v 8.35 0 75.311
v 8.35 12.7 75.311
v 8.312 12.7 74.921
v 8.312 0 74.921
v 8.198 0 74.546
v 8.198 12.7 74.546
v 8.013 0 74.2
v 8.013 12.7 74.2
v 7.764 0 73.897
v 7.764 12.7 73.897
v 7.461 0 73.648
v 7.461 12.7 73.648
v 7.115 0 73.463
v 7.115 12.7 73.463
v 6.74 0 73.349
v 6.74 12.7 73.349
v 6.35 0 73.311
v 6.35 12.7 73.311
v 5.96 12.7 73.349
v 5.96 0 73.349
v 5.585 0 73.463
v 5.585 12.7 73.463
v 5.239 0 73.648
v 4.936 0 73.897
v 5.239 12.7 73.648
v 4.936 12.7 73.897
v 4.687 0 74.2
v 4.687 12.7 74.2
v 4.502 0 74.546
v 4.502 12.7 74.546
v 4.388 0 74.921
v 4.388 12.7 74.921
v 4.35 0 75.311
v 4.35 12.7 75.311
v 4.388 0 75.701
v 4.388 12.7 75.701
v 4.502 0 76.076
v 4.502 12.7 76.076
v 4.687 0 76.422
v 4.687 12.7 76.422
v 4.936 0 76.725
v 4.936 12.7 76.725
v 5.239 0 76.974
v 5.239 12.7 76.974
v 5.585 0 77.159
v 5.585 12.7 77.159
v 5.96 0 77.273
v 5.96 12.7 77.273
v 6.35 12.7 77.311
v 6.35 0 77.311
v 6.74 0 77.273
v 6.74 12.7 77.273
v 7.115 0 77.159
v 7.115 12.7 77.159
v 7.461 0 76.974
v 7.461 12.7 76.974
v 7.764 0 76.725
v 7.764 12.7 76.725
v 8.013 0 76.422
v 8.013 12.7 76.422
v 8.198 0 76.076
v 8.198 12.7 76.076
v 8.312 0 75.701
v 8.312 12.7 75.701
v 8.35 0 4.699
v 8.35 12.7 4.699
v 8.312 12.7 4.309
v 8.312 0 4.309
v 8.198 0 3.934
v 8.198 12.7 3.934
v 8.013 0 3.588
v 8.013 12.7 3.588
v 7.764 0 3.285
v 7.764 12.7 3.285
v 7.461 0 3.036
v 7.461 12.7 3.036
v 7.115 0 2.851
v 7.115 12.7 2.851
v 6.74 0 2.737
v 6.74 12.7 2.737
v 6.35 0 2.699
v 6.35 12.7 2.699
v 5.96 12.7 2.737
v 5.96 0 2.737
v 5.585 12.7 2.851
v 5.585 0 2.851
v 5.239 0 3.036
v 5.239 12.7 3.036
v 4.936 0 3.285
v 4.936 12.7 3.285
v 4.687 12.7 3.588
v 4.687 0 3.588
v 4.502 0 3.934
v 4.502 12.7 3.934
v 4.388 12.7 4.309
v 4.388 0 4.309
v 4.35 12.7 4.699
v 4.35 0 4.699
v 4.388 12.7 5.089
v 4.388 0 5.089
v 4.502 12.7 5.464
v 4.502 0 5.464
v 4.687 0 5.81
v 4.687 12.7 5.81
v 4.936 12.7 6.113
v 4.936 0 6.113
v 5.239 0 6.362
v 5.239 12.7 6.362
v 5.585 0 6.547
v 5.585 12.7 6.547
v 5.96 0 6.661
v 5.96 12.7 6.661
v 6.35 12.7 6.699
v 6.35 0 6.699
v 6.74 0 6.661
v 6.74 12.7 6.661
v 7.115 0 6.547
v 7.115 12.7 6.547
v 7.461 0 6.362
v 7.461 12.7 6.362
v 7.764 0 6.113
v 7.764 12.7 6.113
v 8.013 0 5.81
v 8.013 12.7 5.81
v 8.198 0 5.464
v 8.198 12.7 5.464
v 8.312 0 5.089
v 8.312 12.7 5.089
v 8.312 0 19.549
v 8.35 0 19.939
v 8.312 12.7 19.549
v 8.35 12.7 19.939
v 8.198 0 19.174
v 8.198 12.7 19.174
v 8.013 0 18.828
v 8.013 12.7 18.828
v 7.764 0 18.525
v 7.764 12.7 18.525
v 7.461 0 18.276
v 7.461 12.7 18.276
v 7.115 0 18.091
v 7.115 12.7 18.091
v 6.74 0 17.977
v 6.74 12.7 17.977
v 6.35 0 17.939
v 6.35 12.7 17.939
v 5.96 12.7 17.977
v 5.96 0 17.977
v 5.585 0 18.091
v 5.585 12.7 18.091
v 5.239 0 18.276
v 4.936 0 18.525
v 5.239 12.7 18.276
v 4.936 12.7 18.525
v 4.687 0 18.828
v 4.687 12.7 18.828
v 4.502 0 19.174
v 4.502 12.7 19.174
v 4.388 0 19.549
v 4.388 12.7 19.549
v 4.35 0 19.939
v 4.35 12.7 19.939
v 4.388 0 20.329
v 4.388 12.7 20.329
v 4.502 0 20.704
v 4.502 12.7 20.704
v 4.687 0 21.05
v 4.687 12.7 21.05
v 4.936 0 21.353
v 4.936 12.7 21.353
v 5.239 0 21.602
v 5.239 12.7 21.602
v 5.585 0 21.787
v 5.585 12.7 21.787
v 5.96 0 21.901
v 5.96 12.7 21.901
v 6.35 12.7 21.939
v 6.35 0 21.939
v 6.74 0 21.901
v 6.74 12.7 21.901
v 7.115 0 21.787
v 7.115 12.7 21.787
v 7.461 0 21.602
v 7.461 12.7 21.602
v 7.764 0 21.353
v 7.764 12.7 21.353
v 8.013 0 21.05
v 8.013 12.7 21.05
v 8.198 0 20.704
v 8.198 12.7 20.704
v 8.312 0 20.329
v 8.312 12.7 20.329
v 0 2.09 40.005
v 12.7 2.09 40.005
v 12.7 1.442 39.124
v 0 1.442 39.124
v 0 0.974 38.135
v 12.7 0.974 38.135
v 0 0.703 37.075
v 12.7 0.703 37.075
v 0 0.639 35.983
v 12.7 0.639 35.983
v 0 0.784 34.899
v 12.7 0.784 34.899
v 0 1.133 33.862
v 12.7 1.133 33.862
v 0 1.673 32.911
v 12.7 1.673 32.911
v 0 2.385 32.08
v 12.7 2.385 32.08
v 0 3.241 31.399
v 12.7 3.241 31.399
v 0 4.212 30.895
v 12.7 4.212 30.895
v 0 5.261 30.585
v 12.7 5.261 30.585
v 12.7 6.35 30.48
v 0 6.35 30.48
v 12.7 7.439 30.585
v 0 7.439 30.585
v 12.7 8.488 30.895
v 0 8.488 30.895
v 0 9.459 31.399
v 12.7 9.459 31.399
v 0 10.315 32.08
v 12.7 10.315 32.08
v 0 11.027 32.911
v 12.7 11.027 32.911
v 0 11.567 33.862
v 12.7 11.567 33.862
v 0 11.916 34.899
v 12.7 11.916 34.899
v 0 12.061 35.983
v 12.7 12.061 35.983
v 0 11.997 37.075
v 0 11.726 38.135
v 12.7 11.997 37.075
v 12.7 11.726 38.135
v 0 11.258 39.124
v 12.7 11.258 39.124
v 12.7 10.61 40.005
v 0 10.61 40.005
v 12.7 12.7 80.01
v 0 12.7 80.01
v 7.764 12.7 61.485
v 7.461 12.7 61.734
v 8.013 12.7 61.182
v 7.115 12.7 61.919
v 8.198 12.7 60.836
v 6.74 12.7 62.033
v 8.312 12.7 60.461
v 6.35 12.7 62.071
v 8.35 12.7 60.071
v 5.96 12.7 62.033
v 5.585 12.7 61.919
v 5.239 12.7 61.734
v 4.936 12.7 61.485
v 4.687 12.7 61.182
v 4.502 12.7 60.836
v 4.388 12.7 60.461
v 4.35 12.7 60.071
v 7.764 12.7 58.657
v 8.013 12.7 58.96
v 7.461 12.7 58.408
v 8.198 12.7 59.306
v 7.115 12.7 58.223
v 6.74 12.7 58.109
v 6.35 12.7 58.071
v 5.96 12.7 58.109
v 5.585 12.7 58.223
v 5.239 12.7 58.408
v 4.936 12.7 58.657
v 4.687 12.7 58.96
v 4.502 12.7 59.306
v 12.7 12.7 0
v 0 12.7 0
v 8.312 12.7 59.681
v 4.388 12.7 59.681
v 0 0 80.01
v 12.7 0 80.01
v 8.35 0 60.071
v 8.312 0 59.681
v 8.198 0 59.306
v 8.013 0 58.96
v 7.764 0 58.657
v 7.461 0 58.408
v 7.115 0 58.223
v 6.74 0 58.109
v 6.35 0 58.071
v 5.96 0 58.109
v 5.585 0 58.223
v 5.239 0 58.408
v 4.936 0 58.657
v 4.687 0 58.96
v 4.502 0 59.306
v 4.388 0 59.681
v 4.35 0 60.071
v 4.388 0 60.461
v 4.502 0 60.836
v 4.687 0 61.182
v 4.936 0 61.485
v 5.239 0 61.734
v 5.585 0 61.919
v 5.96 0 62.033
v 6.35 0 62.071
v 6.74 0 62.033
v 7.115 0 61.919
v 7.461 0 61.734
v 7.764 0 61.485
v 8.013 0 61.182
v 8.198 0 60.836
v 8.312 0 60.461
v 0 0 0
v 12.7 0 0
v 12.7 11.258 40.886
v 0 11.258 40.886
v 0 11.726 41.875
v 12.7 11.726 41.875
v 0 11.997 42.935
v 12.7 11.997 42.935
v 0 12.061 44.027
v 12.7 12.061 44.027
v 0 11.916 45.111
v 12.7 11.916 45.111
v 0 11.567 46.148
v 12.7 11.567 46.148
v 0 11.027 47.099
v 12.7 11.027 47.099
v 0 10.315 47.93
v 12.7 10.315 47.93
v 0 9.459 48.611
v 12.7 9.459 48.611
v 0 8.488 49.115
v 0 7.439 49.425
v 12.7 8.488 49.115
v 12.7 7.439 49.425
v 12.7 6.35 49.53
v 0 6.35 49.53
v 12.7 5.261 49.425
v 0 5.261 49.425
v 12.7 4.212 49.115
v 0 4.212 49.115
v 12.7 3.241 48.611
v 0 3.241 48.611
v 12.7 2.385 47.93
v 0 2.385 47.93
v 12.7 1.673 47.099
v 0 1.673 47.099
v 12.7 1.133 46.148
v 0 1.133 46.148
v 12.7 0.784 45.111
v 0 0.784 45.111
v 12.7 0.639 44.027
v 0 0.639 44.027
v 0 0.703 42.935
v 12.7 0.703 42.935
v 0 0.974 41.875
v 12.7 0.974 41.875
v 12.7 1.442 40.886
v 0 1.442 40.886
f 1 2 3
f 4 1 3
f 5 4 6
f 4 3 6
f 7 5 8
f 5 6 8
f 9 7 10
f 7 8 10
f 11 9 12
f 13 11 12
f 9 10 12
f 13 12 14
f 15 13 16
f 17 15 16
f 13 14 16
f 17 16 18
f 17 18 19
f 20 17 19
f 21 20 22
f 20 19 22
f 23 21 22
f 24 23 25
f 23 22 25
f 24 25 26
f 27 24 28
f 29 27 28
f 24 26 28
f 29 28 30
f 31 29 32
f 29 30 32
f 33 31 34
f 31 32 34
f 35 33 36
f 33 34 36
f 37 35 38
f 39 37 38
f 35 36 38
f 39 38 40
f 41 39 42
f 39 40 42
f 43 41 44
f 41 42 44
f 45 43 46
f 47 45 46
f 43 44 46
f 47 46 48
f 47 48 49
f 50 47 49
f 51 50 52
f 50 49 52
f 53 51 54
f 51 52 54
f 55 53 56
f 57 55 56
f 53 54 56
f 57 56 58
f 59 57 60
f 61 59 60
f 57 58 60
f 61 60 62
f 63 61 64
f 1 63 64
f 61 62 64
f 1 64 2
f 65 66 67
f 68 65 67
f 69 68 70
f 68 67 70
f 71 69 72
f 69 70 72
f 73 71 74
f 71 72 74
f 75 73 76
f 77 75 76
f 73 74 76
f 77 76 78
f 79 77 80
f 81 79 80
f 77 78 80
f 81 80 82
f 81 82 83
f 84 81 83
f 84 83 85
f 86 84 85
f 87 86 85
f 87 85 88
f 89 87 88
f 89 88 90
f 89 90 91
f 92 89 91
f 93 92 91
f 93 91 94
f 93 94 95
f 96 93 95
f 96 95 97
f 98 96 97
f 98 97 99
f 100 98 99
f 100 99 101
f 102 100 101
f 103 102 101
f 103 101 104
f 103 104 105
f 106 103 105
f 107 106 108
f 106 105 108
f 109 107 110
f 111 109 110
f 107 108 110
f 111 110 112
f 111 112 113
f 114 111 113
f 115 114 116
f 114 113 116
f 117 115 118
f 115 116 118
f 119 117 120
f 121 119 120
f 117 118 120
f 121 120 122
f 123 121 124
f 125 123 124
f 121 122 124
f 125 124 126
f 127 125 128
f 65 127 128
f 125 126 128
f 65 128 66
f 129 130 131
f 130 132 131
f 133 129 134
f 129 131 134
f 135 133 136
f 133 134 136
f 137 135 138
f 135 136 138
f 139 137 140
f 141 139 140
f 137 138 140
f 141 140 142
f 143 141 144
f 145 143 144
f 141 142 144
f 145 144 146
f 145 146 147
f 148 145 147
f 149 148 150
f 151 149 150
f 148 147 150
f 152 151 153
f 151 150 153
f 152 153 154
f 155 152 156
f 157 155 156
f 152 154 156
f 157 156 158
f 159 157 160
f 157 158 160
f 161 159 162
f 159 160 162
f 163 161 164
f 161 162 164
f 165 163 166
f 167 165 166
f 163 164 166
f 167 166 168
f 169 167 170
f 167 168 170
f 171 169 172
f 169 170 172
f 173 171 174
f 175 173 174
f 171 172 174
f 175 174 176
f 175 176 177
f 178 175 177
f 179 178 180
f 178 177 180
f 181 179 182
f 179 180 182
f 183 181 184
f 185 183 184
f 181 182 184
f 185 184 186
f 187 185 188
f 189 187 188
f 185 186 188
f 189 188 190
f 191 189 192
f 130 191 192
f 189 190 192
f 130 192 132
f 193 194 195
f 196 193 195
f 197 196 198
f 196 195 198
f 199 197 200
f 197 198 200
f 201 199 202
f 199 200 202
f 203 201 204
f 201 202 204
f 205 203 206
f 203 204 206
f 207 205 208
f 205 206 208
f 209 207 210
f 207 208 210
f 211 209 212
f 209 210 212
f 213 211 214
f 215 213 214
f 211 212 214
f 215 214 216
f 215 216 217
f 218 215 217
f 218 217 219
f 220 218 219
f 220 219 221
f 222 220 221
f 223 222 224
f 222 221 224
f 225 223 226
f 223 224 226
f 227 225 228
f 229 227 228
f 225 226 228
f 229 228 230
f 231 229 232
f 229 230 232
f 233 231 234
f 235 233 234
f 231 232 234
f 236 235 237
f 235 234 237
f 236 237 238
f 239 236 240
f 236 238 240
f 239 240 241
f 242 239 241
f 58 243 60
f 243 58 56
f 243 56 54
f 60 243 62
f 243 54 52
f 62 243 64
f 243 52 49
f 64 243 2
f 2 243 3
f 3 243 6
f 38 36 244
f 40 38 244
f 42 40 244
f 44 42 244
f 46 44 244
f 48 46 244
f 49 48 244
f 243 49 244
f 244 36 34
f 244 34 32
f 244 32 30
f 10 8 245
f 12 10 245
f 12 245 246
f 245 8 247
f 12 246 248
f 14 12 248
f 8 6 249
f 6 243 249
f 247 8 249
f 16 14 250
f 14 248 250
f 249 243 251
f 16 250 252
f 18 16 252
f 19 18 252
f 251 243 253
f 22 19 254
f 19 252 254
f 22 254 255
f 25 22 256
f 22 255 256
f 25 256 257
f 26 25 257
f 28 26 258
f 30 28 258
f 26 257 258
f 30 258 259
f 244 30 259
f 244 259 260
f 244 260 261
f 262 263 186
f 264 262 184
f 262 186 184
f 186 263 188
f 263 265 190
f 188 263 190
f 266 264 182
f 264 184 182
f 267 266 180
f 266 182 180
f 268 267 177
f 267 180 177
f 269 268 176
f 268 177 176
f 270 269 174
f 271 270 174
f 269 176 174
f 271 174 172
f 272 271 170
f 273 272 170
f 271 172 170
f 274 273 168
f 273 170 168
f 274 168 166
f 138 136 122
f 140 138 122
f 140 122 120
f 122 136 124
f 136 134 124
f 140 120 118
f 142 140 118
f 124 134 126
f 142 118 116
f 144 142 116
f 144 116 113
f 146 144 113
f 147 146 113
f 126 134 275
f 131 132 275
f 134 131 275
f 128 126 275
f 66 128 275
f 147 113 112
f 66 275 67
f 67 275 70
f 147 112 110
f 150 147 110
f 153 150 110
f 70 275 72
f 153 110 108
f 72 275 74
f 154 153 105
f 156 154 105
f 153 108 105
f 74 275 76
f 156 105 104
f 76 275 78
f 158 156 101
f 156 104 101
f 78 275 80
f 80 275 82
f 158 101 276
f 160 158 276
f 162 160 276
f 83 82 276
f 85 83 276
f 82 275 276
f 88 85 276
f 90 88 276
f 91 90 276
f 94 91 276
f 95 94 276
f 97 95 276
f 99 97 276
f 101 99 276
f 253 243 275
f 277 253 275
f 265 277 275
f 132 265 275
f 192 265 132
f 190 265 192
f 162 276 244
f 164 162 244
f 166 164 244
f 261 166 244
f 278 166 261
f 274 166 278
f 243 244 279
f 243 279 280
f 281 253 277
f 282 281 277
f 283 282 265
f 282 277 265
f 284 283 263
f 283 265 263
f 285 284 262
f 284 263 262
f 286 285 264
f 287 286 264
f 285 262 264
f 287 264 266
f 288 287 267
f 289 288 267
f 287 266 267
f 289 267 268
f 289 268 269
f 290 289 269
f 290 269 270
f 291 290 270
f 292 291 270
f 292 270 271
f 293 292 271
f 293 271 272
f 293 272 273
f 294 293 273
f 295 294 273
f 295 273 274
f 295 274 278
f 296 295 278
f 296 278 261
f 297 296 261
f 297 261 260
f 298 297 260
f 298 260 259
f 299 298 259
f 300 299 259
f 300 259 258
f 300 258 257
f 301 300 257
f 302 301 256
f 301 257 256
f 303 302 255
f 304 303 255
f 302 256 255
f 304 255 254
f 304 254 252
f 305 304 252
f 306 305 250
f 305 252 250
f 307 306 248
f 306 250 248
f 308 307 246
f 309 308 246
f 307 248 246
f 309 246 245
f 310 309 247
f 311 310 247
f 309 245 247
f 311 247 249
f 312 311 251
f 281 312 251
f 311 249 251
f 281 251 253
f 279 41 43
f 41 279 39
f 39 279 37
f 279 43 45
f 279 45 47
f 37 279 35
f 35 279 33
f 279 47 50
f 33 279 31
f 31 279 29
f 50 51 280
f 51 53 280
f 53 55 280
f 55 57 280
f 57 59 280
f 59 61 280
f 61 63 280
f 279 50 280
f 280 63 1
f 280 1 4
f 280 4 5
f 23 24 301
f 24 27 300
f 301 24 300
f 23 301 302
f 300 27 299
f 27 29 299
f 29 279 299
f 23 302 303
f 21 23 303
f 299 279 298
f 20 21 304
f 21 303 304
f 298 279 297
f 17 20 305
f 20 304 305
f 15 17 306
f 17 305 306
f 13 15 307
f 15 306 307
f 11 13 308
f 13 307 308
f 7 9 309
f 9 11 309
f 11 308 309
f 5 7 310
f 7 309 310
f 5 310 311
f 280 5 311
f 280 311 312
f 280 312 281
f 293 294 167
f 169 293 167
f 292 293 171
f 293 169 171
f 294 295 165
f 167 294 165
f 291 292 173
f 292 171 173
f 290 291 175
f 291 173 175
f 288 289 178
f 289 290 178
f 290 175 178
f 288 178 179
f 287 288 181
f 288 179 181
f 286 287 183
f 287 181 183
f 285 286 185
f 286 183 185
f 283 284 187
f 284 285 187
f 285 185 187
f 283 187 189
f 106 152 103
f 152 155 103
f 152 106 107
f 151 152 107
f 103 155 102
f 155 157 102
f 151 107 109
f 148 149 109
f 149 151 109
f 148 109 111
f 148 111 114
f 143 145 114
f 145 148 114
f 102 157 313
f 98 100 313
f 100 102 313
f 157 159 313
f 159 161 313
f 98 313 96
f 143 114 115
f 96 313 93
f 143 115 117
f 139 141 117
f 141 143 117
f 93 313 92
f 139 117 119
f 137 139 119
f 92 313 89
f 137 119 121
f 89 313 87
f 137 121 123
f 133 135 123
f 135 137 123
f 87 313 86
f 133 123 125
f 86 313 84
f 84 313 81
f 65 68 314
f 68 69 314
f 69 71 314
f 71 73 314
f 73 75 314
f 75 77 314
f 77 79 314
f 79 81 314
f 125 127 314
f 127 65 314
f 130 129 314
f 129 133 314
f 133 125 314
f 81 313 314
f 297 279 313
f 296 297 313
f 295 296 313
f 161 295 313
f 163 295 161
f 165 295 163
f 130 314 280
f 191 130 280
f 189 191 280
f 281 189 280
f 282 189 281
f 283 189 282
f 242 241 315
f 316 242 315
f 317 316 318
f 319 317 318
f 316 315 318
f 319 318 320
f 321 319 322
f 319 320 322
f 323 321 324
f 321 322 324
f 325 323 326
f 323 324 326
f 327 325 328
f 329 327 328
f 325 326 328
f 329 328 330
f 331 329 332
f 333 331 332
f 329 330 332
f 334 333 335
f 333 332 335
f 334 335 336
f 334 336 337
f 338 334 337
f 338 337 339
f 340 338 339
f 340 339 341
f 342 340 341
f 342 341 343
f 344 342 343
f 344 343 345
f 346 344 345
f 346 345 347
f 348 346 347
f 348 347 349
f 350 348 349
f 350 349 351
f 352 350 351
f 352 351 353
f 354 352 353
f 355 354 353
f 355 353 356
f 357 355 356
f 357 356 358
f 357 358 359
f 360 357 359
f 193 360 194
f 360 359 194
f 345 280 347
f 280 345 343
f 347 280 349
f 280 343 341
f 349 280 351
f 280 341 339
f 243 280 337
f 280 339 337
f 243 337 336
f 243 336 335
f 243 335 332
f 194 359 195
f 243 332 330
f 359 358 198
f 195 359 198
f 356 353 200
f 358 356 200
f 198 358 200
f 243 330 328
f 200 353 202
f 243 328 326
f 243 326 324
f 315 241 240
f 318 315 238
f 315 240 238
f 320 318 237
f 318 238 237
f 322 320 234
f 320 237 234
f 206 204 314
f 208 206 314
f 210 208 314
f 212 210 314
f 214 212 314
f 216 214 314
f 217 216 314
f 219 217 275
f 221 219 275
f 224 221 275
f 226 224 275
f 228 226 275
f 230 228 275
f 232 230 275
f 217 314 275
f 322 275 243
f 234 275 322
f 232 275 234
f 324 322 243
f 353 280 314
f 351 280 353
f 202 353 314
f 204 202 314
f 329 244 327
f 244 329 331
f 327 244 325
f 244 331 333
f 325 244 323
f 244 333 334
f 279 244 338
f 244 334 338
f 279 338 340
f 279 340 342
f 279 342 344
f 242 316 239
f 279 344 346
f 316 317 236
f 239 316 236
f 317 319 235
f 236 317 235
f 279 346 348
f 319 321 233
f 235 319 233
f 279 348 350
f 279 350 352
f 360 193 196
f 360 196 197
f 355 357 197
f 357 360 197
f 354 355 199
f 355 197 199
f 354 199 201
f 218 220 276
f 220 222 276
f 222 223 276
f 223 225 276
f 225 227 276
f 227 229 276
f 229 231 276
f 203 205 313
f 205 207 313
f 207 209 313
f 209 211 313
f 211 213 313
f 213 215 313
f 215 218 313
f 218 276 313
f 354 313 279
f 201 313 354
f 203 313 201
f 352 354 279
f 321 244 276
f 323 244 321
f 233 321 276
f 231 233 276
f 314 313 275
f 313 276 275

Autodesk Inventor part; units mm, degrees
ref_plane "YZ Plane" through (0, 0, 0) normal (1, 0, 0) x (0, 1, 0)
ref_plane "XZ Plane" through (0, 0, 0) normal (0, 1, 0) x (-1, 0, 0)
ref_plane "XY Plane" through (0, 0, 0) normal (0, 0, 1) x (1, 0, 0)
sketch "Sketch1" plane through (0, 0, 0) normal (0, 0, 1) x (1, 0, 0)
  line L0 (0, 0) -> (12.7, 0)
  line L1 (12.7, 0) -> (12.7, 12.7)
  line L2 (12.7, 12.7) -> (0, 12.7)
  line L3 (0, 12.7) -> (0, 0)
  dimension "d0" = 12.7
  dimension "d1" = 12.7
extrude "Extrusion1" add sketch "Sketch1" along normal blind 80.01
sketch "Sketch2" plane through (12.7, 0, 0) normal (1, 0, 0) x (0, 0, -1)
  circle A0 centre (-43.815, 6.35) radius 5.715
  circle A1 centre (-36.195, 6.35) radius 5.715
  line L0 (-43.815, 6.35) -> (-36.195, 6.35) construction
  line L1 (0, 12.7) -> (-80.01, 12.7) construction
  line L2 (-36.195, 6.35) -> (-40.005, 6.35) construction
  line L3 (-80.01, 0) -> (-80.01, 12.7) construction
  point P0 (0, 0)
  point P1 (-40.005, 10.6097)
  point P2 (-40.005, 2.0903)
  dimension "d4" = 11.43
  dimension "d5" = 11.43
  dimension "d6" = 6.35
  dimension "d7" = 7.62
  dimension "d8" = 40.005
extrude "Extrusion2" cut sketch "Sketch2" against normal through all
sketch "Sketch3" plane through (0, 12.7, 0) normal (0, 1, 0) x (1, 0, 0)
  circle A0 centre (6.35, -75.311) radius 2
  line L0 (12.7, -80.01) -> (0, -80.01) projected
  line L1 (0, 0) -> (0, -80.01) projected
  circle A1 centre (6.35, -60.071) radius 2
  circle A2 centre (6.35, -4.699) radius 2
  circle A3 centre (6.35, -19.939) radius 2
  line L2 (12.7, 0) -> (0, 0) projected
  dimension "d11" = 4
  dimension "d12" = 4.699
  dimension "d13" = 6.35
  dimension "d14" = 4
  dimension "d15" = 15.24
  dimension "d16" = 6.35
  dimension "d17" = 4
  dimension "d18" = 4
  dimension "d19" = 6.35
  dimension "d20" = 6.35
  dimension "d21" = 4.699
  dimension "d22" = 15.24
extrude "Extrusion3" cut sketch "Sketch3" against normal through all
properties part number "Mockup Load Cell (based on 1kg Adafruit)"
